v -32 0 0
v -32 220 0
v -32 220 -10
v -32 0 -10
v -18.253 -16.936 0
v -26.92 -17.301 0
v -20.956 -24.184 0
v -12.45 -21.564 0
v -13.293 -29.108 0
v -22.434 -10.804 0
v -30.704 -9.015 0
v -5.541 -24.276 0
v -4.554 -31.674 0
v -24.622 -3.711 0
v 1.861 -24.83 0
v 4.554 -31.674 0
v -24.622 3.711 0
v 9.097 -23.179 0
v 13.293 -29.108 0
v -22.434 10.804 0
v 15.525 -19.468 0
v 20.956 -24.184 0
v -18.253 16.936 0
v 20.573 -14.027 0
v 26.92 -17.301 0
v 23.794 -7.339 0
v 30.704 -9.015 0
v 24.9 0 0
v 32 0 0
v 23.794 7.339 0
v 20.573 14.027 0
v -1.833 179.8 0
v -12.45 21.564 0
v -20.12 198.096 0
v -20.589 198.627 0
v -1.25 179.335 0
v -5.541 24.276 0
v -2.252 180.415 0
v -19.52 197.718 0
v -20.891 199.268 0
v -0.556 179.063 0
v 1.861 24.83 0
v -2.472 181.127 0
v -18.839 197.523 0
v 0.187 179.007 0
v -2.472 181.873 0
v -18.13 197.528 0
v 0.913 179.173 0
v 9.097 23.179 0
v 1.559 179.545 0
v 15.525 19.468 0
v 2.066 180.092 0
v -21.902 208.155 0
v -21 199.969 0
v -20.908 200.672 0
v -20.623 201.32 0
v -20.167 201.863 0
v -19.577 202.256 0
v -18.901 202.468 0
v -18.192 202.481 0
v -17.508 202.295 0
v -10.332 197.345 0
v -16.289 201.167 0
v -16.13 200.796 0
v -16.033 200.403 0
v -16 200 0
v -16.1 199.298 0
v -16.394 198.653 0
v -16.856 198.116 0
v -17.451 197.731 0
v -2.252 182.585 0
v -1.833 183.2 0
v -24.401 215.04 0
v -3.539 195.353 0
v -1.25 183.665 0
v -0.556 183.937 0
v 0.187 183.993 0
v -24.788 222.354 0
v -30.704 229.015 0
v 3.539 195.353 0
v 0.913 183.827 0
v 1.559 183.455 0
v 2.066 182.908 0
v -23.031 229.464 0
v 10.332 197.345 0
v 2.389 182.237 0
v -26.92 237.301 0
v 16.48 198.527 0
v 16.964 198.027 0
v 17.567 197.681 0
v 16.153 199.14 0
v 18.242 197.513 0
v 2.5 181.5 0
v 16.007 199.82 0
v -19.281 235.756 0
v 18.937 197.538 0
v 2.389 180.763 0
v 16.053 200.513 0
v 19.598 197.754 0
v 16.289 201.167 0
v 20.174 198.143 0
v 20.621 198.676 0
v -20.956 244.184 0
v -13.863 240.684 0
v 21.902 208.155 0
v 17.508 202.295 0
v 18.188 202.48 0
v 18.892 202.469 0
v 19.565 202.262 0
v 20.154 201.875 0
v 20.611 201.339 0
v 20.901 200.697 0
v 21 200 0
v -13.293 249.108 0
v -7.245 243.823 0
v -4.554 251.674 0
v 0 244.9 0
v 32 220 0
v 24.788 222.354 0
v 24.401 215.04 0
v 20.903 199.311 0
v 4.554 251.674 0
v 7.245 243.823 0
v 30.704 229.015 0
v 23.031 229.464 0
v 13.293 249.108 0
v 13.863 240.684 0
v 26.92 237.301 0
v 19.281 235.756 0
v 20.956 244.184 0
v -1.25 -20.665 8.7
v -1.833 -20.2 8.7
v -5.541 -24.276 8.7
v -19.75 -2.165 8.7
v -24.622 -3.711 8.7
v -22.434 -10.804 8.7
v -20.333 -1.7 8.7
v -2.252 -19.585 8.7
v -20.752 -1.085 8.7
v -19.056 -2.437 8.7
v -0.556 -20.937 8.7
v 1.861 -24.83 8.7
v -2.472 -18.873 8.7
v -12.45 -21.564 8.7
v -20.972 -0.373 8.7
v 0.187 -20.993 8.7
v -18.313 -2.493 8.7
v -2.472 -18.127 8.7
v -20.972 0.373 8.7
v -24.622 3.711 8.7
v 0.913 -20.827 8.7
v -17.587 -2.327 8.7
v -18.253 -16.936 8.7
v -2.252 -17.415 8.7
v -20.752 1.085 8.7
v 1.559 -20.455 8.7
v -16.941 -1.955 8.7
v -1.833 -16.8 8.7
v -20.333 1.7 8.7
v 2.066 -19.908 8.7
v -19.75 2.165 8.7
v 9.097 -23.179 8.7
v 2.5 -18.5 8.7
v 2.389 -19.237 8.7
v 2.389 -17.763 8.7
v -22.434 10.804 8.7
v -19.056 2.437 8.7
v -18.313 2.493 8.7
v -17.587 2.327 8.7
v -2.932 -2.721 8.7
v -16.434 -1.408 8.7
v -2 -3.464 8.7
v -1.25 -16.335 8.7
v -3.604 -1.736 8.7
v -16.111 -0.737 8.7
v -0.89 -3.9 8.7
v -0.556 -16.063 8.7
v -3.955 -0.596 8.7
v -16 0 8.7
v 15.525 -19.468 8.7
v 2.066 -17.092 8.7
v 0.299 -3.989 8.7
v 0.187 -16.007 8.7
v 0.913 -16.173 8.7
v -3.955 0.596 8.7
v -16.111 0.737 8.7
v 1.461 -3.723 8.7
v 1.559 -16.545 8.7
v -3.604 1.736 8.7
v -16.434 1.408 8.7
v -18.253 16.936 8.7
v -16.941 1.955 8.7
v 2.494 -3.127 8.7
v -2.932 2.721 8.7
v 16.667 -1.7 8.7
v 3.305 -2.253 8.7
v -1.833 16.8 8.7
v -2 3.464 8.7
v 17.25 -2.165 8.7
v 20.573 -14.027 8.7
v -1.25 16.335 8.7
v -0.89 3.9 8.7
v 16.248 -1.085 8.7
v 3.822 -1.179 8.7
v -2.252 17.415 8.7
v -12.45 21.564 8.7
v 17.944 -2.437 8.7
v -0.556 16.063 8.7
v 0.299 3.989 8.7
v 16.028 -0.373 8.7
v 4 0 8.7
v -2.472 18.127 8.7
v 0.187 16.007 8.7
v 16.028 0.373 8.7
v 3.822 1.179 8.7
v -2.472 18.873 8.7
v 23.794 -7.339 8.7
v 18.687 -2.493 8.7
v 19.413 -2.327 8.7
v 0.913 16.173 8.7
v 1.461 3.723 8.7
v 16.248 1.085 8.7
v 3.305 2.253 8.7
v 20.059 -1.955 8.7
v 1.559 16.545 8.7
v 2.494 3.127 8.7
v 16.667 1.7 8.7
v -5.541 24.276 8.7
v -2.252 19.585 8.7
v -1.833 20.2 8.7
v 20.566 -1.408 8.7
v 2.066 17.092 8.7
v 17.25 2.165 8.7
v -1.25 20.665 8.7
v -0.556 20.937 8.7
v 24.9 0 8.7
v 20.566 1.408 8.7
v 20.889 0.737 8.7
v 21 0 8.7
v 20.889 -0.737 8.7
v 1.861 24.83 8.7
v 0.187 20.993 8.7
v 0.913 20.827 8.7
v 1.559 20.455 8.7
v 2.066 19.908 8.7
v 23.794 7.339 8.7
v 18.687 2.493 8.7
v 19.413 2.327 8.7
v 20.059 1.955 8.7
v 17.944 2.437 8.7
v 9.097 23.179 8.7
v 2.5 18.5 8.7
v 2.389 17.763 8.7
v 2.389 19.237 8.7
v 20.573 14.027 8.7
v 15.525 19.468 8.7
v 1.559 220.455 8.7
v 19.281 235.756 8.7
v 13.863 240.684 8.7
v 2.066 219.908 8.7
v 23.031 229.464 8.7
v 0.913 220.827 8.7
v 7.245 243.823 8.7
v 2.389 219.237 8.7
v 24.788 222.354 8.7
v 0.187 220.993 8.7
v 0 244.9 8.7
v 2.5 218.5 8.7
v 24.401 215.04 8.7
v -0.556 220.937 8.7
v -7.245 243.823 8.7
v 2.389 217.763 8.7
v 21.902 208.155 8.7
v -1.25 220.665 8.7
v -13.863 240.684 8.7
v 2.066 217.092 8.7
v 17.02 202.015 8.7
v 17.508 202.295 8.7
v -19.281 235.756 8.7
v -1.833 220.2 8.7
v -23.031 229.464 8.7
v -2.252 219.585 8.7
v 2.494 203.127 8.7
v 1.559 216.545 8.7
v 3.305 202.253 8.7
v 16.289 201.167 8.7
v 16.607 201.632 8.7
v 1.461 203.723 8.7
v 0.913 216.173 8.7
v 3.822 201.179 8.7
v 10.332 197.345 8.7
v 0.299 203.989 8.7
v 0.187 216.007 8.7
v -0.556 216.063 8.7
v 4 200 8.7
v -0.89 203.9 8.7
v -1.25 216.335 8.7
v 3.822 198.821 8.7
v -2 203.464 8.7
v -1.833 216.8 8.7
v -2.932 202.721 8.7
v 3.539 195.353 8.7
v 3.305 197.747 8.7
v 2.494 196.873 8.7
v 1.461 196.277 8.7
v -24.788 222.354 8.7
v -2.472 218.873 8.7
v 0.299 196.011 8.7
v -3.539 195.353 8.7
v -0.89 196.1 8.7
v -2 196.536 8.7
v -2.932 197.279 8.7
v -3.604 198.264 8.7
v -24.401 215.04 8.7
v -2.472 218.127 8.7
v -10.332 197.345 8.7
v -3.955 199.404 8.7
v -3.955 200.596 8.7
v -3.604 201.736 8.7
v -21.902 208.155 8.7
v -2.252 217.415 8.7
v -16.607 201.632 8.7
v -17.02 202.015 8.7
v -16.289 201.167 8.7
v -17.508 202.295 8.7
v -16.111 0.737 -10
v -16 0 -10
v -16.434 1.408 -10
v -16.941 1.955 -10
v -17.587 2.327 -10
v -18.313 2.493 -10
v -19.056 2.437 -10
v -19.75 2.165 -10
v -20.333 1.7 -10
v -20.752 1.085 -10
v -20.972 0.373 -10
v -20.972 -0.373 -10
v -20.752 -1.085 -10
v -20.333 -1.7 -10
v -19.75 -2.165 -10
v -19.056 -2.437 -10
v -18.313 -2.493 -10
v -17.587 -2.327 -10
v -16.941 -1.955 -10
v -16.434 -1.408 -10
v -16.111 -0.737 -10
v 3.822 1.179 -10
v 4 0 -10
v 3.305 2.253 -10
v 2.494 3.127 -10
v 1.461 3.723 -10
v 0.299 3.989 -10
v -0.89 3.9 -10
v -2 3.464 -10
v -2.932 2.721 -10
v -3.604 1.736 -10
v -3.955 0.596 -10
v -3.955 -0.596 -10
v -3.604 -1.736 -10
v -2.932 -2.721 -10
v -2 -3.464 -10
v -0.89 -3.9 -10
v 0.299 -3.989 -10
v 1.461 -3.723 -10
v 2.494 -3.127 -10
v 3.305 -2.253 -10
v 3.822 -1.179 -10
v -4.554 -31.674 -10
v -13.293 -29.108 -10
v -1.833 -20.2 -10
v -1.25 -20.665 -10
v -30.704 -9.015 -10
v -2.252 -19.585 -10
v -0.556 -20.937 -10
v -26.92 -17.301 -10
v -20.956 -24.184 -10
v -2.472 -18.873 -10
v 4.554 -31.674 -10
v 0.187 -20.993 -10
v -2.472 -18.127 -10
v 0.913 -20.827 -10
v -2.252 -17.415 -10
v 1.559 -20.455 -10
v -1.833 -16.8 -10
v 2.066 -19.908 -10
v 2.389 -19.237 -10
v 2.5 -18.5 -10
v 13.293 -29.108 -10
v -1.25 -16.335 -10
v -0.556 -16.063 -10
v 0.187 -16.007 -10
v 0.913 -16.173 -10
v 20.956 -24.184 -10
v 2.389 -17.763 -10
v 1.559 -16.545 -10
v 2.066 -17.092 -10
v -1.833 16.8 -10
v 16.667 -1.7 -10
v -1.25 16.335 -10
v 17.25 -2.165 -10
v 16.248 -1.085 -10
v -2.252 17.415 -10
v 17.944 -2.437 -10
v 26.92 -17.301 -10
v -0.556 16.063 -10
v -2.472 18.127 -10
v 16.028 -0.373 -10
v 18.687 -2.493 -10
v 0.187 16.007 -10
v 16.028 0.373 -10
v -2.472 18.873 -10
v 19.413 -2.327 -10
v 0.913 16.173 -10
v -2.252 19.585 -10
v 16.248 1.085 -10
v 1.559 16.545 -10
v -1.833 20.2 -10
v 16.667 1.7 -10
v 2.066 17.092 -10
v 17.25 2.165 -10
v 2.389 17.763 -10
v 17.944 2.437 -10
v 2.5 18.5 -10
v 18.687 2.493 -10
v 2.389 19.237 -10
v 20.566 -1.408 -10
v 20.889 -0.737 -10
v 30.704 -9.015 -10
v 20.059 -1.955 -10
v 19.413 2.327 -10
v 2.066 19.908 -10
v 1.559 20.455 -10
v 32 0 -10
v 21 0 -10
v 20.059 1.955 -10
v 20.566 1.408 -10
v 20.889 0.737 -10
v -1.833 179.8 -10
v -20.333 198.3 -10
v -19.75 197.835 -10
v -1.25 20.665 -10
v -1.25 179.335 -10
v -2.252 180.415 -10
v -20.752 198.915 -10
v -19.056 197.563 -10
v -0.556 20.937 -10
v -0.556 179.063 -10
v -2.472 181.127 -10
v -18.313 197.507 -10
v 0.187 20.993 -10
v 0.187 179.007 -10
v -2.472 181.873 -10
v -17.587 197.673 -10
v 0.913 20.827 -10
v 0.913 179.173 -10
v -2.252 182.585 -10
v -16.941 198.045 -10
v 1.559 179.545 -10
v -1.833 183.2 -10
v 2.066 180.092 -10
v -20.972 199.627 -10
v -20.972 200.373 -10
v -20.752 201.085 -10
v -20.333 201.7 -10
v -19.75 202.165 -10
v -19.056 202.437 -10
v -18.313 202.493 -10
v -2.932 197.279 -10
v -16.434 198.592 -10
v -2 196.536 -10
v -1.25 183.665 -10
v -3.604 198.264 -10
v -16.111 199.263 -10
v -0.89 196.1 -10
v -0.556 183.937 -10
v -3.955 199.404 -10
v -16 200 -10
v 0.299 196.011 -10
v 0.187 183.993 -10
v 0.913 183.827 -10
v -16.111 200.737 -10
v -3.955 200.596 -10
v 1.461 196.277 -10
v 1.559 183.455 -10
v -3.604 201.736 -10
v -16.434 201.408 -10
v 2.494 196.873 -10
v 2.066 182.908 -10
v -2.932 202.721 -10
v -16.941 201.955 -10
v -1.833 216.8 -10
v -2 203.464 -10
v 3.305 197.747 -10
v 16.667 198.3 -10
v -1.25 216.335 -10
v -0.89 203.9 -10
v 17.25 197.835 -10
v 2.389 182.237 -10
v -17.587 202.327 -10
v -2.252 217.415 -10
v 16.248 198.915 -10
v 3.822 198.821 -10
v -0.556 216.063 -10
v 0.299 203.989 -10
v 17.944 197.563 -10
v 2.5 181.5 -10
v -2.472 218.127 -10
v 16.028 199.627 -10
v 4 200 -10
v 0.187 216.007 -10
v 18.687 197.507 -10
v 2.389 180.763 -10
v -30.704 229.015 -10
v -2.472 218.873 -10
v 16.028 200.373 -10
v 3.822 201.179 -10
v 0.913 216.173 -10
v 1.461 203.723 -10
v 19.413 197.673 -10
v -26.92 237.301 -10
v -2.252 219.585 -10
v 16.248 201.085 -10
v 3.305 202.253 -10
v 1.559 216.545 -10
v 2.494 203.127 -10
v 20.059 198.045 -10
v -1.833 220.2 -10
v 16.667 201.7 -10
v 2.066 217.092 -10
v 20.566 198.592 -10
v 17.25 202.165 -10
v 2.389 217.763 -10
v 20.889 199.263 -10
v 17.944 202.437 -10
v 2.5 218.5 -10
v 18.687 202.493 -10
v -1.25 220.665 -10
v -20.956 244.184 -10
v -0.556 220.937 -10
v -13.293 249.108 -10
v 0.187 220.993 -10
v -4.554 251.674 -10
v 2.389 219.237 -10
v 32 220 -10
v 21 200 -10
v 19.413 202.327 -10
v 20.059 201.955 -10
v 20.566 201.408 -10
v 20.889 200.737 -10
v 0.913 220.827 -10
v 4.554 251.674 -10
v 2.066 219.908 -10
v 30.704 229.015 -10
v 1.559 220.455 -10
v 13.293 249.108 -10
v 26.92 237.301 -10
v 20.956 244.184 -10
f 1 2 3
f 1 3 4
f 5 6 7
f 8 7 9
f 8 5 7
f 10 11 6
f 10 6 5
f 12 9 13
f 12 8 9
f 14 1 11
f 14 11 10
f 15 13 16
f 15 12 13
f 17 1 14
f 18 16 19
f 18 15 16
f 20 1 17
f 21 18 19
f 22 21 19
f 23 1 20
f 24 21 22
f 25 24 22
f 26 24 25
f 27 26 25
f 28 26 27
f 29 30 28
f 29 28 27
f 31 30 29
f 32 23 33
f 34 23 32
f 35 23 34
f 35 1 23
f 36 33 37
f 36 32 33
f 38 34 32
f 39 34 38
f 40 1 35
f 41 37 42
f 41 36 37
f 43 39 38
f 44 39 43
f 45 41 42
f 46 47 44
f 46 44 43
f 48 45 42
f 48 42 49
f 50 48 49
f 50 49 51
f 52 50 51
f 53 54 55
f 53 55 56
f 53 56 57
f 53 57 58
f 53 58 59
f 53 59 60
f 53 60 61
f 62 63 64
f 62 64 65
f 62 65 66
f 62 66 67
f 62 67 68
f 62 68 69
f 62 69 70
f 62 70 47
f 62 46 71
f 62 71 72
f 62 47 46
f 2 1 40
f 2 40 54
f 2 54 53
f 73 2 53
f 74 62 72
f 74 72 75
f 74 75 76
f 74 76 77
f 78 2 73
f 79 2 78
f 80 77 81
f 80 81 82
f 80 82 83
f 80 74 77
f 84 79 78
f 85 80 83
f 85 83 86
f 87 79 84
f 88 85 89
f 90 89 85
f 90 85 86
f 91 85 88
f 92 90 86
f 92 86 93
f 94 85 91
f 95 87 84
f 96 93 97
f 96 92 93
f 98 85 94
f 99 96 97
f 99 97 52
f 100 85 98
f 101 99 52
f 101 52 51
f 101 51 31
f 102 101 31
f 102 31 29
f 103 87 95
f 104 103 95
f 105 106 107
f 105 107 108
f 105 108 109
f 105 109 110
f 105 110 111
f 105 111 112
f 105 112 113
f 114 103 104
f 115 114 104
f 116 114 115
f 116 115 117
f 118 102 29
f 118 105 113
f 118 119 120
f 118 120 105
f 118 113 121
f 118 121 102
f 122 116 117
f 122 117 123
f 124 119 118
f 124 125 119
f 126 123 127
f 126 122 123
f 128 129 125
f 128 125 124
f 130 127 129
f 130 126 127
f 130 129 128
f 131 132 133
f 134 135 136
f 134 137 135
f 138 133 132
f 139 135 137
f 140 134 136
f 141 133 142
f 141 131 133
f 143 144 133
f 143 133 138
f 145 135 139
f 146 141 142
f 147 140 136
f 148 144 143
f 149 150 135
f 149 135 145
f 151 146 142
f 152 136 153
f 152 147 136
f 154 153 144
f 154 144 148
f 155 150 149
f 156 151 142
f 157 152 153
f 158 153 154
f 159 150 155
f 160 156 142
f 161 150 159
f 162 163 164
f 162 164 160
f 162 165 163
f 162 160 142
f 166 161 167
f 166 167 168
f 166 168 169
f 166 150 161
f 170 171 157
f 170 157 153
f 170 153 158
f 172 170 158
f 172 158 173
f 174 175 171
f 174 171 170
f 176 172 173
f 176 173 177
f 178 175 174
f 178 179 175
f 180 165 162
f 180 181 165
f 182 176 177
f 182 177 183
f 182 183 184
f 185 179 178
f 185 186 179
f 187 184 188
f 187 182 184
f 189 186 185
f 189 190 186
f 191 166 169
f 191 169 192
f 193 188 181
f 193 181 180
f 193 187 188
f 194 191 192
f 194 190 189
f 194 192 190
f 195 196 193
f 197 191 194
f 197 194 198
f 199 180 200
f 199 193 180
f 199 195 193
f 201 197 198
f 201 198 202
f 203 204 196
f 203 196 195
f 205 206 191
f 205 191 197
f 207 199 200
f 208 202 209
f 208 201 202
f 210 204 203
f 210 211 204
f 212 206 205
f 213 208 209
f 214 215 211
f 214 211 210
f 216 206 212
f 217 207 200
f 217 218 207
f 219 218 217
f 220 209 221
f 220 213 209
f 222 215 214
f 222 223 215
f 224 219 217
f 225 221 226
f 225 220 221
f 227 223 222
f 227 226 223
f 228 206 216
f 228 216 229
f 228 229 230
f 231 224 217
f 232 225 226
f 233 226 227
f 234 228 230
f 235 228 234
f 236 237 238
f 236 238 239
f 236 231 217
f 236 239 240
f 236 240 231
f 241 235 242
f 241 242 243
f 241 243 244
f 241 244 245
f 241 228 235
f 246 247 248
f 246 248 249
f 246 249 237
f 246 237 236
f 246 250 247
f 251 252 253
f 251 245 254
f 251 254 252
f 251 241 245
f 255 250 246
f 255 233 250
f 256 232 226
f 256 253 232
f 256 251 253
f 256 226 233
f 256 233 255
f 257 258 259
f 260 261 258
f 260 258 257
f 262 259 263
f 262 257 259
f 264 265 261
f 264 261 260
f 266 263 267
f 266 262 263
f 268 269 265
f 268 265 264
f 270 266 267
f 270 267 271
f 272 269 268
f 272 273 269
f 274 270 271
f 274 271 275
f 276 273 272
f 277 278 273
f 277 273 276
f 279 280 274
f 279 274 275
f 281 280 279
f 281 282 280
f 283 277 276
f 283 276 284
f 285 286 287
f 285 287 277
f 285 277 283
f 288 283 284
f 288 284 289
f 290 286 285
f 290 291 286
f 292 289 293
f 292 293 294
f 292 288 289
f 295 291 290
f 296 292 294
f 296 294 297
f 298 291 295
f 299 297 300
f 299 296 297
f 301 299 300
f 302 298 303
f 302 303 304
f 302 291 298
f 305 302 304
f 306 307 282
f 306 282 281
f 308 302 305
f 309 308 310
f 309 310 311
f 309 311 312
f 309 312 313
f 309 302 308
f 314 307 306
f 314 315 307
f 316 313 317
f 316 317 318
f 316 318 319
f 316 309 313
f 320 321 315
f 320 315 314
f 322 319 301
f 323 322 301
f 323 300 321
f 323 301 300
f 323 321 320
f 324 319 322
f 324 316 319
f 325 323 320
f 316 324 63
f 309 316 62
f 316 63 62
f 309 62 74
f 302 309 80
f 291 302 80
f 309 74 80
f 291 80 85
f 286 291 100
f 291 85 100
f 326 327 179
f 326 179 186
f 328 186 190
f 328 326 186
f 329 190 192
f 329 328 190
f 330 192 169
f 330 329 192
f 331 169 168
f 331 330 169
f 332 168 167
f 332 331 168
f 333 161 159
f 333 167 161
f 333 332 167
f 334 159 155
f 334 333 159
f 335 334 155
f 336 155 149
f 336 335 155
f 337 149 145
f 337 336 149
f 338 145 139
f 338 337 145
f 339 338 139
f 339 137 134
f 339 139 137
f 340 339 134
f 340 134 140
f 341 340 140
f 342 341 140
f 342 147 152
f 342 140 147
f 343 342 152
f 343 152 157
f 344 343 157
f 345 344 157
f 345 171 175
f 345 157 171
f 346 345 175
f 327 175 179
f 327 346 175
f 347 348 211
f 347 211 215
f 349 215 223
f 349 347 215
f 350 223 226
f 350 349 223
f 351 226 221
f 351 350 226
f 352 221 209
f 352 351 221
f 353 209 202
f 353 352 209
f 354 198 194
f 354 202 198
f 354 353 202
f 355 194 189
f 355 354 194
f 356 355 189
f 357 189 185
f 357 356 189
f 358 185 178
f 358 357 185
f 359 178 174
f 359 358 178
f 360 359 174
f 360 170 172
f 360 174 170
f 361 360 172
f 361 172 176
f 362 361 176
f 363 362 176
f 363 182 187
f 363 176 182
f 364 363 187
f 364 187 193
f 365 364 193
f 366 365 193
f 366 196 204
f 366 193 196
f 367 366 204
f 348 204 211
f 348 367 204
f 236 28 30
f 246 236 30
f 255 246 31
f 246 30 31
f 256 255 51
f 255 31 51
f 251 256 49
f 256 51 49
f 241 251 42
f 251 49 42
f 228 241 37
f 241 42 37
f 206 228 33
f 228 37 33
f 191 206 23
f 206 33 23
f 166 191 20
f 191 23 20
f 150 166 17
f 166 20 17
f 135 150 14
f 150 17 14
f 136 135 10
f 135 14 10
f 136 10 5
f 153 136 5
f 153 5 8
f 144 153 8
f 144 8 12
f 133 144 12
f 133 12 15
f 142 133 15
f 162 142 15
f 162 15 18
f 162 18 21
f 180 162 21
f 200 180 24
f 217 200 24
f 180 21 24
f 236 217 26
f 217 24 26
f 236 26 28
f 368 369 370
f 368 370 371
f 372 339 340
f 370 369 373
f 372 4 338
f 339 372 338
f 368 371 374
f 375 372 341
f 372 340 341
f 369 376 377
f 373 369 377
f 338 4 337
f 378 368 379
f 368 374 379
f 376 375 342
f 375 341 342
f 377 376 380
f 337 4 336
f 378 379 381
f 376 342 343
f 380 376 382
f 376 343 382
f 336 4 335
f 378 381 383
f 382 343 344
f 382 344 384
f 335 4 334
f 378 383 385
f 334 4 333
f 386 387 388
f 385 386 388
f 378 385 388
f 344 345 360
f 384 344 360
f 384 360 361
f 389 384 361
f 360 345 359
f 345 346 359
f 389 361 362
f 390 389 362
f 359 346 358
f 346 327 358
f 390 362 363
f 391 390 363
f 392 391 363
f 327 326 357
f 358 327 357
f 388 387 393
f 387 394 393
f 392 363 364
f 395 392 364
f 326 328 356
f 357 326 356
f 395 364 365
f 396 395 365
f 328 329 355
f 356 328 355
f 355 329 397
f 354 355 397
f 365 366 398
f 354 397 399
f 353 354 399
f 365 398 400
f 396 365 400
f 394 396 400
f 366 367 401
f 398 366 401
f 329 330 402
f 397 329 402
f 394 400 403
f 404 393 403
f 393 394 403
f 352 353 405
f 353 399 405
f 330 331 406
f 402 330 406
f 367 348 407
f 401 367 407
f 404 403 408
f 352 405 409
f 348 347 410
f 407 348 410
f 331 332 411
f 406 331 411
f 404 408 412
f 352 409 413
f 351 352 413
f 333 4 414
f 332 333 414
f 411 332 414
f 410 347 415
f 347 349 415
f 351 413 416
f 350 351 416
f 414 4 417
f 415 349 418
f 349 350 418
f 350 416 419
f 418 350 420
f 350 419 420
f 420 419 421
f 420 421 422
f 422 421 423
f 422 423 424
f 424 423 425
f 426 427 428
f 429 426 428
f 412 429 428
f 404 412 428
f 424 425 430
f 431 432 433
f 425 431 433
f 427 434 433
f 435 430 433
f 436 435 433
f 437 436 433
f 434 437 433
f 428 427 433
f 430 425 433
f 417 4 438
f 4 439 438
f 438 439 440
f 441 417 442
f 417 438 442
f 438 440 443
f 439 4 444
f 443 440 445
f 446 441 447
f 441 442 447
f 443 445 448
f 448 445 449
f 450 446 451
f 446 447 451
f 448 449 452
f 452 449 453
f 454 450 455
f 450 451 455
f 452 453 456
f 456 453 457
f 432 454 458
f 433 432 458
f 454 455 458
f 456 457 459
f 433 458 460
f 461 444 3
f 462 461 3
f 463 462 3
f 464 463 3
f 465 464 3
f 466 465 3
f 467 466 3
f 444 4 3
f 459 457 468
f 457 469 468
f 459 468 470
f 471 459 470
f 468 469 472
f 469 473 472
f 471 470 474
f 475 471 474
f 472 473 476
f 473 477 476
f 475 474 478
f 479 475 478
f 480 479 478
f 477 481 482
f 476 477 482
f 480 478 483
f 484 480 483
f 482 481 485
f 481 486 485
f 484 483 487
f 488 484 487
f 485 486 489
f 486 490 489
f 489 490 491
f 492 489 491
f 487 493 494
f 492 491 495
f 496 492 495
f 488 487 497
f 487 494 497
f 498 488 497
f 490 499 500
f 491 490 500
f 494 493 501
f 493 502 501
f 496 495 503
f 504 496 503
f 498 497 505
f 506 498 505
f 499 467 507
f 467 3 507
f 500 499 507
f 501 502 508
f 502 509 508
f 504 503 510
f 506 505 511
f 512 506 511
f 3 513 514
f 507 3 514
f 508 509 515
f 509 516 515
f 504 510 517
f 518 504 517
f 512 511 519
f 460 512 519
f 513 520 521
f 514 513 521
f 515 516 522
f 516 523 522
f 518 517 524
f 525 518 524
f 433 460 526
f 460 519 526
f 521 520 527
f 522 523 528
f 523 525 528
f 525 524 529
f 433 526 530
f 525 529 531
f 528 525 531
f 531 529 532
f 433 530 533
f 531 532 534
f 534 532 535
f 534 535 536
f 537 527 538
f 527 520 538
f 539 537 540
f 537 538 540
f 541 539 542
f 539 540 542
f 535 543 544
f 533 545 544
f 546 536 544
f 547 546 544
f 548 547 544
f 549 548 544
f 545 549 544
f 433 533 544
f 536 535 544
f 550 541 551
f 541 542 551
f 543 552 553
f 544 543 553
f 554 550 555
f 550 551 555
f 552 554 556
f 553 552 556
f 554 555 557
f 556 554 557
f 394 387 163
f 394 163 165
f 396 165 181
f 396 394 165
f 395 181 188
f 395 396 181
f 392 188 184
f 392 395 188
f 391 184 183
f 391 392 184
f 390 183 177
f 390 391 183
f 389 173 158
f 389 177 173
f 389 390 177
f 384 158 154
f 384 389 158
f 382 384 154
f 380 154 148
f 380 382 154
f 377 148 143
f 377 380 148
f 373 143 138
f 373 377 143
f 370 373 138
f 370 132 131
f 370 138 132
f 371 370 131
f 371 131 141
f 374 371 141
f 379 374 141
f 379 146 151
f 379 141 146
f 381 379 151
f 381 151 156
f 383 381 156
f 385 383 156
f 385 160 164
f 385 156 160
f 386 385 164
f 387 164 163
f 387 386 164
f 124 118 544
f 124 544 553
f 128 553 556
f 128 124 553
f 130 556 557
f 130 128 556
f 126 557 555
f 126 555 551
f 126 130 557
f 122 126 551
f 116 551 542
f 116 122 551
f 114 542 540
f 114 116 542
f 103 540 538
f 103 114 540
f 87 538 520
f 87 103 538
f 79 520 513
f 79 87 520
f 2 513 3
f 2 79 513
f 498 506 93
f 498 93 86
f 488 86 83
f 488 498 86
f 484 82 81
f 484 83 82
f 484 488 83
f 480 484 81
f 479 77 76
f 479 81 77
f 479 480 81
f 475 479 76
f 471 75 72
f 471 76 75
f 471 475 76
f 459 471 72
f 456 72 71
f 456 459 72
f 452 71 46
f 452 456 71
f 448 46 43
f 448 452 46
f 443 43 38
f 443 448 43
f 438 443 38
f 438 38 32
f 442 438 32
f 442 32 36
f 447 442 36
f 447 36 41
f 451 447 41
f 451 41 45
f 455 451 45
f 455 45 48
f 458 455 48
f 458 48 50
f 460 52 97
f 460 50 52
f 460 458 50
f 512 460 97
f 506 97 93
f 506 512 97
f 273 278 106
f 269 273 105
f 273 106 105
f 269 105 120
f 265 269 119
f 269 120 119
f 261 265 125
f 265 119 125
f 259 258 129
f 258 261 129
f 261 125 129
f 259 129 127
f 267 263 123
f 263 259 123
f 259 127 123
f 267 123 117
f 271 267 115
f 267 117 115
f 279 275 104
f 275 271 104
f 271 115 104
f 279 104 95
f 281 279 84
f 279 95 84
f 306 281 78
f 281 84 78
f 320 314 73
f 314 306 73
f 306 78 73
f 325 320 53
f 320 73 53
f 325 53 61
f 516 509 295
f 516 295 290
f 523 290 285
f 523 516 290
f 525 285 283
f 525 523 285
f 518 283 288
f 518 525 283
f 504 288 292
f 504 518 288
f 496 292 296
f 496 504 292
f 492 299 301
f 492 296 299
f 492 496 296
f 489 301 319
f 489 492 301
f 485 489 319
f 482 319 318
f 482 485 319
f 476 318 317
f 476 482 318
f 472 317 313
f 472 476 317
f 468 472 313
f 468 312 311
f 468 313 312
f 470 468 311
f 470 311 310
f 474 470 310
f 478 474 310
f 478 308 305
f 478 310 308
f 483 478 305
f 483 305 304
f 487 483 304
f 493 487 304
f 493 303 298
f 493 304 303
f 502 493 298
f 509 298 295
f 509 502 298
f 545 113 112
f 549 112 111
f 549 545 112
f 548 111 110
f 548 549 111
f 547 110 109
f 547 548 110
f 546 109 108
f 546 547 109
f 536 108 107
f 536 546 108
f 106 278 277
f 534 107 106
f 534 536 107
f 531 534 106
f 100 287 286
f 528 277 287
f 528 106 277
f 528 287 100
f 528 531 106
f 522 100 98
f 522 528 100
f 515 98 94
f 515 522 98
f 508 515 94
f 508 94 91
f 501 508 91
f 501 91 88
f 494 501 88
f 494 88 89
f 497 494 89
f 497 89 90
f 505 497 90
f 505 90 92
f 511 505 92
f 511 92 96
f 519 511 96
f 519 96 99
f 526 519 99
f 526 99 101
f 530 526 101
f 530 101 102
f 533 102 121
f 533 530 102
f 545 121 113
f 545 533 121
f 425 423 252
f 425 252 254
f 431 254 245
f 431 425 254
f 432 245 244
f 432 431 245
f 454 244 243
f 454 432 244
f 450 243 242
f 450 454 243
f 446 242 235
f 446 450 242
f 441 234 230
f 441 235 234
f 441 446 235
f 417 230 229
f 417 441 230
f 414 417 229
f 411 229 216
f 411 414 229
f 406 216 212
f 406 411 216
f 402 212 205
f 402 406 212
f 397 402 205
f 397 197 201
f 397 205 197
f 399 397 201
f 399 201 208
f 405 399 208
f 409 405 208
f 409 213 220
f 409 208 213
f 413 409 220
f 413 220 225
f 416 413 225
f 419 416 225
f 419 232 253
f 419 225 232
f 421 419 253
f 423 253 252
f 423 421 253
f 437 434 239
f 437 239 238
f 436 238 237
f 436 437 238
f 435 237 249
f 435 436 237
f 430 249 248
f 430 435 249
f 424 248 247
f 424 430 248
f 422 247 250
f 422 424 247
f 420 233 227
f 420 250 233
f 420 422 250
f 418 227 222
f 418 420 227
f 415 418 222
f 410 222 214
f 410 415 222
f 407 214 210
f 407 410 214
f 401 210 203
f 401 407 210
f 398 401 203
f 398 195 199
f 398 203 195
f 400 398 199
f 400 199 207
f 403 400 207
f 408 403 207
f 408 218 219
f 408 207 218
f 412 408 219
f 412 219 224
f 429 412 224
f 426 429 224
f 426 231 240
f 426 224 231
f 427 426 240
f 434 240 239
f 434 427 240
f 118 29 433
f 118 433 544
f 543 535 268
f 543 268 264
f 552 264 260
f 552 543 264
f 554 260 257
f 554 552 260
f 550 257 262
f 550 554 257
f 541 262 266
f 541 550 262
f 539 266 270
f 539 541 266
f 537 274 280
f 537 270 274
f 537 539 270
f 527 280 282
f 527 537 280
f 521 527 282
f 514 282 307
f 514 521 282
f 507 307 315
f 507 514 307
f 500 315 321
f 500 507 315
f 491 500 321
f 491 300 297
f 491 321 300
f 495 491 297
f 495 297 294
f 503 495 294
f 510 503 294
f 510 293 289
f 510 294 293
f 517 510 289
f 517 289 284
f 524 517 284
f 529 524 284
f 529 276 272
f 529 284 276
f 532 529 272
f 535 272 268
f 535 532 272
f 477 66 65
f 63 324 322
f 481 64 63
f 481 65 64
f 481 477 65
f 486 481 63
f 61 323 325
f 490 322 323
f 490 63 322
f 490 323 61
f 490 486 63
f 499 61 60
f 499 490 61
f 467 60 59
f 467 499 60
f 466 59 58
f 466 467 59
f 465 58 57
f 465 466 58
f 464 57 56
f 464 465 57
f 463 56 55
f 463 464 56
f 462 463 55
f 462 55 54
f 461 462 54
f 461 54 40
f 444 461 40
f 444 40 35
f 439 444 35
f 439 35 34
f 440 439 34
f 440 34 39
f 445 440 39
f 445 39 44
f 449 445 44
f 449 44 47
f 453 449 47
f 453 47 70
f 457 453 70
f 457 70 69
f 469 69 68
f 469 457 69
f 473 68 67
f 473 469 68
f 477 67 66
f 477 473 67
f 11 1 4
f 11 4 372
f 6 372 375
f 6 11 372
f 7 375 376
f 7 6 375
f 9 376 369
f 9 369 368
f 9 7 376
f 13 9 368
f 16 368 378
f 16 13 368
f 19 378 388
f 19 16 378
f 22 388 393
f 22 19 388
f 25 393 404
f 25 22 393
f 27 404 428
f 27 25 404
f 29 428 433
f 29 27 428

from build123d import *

# Parameters (mm, degrees)
SKETCH_1_R               = 24.9
EXTRUDE_1_DEPTH          = 8.7
EXTRUDE_2_DEPTH          = 10
SKETCH_5_R               = 24.9
EXTRUDE_4_DEPTH          = 8.7
CUT_EXTRUDE_1_DEPTH      = 255.710993088
CUT_EXTRUDE_1_DEPTH_BACK = 255.710993088
SKETCH_2_R               = 4
SKETCH_2_R_2             = 2.5


with BuildPart() as part:
    # 草图1 → 凸台-拉伸1 (new body)
    with BuildSketch(Plane.XY):
        Circle(SKETCH_1_R)
    extrude(amount=EXTRUDE_1_DEPTH)

    # 草图3 → 凸台-拉伸2 (add)
    with BuildSketch(Plane(origin=(0, 0, 0), x_dir=(-1, 0, 0), z_dir=(0, 0, -1))):
        with BuildLine():
            Line((-32, 0), (-32, 220))
            ThreePointArc((-32, 220), (0, 252), (32, 220))
            Line((32, 220), (32, 0))
            ThreePointArc((32, 0), (0, -32), (-32, 0))
        make_face()
    extrude(amount=EXTRUDE_2_DEPTH)

    # 草图5 → 凸台-拉伸4 (add)
    with BuildSketch(Plane.XY):
        with Locations(Location((0, 220, 0), (0, 0, 180))):
            Circle(SKETCH_5_R)
    extrude(amount=EXTRUDE_4_DEPTH)

    # 草图2 → 切除-拉伸1 (cut, two sides: drawn at the far end of the back side and taken through both)
    with BuildSketch(Plane.XY.offset(8.7).offset(-CUT_EXTRUDE_1_DEPTH_BACK)):
        Circle(SKETCH_2_R)
        with Locations((0, 18.5)):
            Circle(SKETCH_2_R_2)
        with Locations((-18.5, 0)):
            Circle(SKETCH_2_R_2)
        with Locations((18.5, 0)):
            Circle(SKETCH_2_R_2)
        with Locations((0, -18.5)):
            Circle(SKETCH_2_R_2)
        with Locations((0, 218.5)):
            Circle(SKETCH_2_R_2)
        with Locations((0, 200)):
            Circle(SKETCH_2_R)
        with Locations((0, 181.5)):
            Circle(SKETCH_2_R_2)
        with Locations((-18.5, 200)):
            Circle(SKETCH_2_R_2)
        with Locations((18.5, 200)):
            Circle(SKETCH_2_R_2)
    extrude(amount=CUT_EXTRUDE_1_DEPTH + CUT_EXTRUDE_1_DEPTH_BACK, mode=Mode.SUBTRACT)


solid = part.part
